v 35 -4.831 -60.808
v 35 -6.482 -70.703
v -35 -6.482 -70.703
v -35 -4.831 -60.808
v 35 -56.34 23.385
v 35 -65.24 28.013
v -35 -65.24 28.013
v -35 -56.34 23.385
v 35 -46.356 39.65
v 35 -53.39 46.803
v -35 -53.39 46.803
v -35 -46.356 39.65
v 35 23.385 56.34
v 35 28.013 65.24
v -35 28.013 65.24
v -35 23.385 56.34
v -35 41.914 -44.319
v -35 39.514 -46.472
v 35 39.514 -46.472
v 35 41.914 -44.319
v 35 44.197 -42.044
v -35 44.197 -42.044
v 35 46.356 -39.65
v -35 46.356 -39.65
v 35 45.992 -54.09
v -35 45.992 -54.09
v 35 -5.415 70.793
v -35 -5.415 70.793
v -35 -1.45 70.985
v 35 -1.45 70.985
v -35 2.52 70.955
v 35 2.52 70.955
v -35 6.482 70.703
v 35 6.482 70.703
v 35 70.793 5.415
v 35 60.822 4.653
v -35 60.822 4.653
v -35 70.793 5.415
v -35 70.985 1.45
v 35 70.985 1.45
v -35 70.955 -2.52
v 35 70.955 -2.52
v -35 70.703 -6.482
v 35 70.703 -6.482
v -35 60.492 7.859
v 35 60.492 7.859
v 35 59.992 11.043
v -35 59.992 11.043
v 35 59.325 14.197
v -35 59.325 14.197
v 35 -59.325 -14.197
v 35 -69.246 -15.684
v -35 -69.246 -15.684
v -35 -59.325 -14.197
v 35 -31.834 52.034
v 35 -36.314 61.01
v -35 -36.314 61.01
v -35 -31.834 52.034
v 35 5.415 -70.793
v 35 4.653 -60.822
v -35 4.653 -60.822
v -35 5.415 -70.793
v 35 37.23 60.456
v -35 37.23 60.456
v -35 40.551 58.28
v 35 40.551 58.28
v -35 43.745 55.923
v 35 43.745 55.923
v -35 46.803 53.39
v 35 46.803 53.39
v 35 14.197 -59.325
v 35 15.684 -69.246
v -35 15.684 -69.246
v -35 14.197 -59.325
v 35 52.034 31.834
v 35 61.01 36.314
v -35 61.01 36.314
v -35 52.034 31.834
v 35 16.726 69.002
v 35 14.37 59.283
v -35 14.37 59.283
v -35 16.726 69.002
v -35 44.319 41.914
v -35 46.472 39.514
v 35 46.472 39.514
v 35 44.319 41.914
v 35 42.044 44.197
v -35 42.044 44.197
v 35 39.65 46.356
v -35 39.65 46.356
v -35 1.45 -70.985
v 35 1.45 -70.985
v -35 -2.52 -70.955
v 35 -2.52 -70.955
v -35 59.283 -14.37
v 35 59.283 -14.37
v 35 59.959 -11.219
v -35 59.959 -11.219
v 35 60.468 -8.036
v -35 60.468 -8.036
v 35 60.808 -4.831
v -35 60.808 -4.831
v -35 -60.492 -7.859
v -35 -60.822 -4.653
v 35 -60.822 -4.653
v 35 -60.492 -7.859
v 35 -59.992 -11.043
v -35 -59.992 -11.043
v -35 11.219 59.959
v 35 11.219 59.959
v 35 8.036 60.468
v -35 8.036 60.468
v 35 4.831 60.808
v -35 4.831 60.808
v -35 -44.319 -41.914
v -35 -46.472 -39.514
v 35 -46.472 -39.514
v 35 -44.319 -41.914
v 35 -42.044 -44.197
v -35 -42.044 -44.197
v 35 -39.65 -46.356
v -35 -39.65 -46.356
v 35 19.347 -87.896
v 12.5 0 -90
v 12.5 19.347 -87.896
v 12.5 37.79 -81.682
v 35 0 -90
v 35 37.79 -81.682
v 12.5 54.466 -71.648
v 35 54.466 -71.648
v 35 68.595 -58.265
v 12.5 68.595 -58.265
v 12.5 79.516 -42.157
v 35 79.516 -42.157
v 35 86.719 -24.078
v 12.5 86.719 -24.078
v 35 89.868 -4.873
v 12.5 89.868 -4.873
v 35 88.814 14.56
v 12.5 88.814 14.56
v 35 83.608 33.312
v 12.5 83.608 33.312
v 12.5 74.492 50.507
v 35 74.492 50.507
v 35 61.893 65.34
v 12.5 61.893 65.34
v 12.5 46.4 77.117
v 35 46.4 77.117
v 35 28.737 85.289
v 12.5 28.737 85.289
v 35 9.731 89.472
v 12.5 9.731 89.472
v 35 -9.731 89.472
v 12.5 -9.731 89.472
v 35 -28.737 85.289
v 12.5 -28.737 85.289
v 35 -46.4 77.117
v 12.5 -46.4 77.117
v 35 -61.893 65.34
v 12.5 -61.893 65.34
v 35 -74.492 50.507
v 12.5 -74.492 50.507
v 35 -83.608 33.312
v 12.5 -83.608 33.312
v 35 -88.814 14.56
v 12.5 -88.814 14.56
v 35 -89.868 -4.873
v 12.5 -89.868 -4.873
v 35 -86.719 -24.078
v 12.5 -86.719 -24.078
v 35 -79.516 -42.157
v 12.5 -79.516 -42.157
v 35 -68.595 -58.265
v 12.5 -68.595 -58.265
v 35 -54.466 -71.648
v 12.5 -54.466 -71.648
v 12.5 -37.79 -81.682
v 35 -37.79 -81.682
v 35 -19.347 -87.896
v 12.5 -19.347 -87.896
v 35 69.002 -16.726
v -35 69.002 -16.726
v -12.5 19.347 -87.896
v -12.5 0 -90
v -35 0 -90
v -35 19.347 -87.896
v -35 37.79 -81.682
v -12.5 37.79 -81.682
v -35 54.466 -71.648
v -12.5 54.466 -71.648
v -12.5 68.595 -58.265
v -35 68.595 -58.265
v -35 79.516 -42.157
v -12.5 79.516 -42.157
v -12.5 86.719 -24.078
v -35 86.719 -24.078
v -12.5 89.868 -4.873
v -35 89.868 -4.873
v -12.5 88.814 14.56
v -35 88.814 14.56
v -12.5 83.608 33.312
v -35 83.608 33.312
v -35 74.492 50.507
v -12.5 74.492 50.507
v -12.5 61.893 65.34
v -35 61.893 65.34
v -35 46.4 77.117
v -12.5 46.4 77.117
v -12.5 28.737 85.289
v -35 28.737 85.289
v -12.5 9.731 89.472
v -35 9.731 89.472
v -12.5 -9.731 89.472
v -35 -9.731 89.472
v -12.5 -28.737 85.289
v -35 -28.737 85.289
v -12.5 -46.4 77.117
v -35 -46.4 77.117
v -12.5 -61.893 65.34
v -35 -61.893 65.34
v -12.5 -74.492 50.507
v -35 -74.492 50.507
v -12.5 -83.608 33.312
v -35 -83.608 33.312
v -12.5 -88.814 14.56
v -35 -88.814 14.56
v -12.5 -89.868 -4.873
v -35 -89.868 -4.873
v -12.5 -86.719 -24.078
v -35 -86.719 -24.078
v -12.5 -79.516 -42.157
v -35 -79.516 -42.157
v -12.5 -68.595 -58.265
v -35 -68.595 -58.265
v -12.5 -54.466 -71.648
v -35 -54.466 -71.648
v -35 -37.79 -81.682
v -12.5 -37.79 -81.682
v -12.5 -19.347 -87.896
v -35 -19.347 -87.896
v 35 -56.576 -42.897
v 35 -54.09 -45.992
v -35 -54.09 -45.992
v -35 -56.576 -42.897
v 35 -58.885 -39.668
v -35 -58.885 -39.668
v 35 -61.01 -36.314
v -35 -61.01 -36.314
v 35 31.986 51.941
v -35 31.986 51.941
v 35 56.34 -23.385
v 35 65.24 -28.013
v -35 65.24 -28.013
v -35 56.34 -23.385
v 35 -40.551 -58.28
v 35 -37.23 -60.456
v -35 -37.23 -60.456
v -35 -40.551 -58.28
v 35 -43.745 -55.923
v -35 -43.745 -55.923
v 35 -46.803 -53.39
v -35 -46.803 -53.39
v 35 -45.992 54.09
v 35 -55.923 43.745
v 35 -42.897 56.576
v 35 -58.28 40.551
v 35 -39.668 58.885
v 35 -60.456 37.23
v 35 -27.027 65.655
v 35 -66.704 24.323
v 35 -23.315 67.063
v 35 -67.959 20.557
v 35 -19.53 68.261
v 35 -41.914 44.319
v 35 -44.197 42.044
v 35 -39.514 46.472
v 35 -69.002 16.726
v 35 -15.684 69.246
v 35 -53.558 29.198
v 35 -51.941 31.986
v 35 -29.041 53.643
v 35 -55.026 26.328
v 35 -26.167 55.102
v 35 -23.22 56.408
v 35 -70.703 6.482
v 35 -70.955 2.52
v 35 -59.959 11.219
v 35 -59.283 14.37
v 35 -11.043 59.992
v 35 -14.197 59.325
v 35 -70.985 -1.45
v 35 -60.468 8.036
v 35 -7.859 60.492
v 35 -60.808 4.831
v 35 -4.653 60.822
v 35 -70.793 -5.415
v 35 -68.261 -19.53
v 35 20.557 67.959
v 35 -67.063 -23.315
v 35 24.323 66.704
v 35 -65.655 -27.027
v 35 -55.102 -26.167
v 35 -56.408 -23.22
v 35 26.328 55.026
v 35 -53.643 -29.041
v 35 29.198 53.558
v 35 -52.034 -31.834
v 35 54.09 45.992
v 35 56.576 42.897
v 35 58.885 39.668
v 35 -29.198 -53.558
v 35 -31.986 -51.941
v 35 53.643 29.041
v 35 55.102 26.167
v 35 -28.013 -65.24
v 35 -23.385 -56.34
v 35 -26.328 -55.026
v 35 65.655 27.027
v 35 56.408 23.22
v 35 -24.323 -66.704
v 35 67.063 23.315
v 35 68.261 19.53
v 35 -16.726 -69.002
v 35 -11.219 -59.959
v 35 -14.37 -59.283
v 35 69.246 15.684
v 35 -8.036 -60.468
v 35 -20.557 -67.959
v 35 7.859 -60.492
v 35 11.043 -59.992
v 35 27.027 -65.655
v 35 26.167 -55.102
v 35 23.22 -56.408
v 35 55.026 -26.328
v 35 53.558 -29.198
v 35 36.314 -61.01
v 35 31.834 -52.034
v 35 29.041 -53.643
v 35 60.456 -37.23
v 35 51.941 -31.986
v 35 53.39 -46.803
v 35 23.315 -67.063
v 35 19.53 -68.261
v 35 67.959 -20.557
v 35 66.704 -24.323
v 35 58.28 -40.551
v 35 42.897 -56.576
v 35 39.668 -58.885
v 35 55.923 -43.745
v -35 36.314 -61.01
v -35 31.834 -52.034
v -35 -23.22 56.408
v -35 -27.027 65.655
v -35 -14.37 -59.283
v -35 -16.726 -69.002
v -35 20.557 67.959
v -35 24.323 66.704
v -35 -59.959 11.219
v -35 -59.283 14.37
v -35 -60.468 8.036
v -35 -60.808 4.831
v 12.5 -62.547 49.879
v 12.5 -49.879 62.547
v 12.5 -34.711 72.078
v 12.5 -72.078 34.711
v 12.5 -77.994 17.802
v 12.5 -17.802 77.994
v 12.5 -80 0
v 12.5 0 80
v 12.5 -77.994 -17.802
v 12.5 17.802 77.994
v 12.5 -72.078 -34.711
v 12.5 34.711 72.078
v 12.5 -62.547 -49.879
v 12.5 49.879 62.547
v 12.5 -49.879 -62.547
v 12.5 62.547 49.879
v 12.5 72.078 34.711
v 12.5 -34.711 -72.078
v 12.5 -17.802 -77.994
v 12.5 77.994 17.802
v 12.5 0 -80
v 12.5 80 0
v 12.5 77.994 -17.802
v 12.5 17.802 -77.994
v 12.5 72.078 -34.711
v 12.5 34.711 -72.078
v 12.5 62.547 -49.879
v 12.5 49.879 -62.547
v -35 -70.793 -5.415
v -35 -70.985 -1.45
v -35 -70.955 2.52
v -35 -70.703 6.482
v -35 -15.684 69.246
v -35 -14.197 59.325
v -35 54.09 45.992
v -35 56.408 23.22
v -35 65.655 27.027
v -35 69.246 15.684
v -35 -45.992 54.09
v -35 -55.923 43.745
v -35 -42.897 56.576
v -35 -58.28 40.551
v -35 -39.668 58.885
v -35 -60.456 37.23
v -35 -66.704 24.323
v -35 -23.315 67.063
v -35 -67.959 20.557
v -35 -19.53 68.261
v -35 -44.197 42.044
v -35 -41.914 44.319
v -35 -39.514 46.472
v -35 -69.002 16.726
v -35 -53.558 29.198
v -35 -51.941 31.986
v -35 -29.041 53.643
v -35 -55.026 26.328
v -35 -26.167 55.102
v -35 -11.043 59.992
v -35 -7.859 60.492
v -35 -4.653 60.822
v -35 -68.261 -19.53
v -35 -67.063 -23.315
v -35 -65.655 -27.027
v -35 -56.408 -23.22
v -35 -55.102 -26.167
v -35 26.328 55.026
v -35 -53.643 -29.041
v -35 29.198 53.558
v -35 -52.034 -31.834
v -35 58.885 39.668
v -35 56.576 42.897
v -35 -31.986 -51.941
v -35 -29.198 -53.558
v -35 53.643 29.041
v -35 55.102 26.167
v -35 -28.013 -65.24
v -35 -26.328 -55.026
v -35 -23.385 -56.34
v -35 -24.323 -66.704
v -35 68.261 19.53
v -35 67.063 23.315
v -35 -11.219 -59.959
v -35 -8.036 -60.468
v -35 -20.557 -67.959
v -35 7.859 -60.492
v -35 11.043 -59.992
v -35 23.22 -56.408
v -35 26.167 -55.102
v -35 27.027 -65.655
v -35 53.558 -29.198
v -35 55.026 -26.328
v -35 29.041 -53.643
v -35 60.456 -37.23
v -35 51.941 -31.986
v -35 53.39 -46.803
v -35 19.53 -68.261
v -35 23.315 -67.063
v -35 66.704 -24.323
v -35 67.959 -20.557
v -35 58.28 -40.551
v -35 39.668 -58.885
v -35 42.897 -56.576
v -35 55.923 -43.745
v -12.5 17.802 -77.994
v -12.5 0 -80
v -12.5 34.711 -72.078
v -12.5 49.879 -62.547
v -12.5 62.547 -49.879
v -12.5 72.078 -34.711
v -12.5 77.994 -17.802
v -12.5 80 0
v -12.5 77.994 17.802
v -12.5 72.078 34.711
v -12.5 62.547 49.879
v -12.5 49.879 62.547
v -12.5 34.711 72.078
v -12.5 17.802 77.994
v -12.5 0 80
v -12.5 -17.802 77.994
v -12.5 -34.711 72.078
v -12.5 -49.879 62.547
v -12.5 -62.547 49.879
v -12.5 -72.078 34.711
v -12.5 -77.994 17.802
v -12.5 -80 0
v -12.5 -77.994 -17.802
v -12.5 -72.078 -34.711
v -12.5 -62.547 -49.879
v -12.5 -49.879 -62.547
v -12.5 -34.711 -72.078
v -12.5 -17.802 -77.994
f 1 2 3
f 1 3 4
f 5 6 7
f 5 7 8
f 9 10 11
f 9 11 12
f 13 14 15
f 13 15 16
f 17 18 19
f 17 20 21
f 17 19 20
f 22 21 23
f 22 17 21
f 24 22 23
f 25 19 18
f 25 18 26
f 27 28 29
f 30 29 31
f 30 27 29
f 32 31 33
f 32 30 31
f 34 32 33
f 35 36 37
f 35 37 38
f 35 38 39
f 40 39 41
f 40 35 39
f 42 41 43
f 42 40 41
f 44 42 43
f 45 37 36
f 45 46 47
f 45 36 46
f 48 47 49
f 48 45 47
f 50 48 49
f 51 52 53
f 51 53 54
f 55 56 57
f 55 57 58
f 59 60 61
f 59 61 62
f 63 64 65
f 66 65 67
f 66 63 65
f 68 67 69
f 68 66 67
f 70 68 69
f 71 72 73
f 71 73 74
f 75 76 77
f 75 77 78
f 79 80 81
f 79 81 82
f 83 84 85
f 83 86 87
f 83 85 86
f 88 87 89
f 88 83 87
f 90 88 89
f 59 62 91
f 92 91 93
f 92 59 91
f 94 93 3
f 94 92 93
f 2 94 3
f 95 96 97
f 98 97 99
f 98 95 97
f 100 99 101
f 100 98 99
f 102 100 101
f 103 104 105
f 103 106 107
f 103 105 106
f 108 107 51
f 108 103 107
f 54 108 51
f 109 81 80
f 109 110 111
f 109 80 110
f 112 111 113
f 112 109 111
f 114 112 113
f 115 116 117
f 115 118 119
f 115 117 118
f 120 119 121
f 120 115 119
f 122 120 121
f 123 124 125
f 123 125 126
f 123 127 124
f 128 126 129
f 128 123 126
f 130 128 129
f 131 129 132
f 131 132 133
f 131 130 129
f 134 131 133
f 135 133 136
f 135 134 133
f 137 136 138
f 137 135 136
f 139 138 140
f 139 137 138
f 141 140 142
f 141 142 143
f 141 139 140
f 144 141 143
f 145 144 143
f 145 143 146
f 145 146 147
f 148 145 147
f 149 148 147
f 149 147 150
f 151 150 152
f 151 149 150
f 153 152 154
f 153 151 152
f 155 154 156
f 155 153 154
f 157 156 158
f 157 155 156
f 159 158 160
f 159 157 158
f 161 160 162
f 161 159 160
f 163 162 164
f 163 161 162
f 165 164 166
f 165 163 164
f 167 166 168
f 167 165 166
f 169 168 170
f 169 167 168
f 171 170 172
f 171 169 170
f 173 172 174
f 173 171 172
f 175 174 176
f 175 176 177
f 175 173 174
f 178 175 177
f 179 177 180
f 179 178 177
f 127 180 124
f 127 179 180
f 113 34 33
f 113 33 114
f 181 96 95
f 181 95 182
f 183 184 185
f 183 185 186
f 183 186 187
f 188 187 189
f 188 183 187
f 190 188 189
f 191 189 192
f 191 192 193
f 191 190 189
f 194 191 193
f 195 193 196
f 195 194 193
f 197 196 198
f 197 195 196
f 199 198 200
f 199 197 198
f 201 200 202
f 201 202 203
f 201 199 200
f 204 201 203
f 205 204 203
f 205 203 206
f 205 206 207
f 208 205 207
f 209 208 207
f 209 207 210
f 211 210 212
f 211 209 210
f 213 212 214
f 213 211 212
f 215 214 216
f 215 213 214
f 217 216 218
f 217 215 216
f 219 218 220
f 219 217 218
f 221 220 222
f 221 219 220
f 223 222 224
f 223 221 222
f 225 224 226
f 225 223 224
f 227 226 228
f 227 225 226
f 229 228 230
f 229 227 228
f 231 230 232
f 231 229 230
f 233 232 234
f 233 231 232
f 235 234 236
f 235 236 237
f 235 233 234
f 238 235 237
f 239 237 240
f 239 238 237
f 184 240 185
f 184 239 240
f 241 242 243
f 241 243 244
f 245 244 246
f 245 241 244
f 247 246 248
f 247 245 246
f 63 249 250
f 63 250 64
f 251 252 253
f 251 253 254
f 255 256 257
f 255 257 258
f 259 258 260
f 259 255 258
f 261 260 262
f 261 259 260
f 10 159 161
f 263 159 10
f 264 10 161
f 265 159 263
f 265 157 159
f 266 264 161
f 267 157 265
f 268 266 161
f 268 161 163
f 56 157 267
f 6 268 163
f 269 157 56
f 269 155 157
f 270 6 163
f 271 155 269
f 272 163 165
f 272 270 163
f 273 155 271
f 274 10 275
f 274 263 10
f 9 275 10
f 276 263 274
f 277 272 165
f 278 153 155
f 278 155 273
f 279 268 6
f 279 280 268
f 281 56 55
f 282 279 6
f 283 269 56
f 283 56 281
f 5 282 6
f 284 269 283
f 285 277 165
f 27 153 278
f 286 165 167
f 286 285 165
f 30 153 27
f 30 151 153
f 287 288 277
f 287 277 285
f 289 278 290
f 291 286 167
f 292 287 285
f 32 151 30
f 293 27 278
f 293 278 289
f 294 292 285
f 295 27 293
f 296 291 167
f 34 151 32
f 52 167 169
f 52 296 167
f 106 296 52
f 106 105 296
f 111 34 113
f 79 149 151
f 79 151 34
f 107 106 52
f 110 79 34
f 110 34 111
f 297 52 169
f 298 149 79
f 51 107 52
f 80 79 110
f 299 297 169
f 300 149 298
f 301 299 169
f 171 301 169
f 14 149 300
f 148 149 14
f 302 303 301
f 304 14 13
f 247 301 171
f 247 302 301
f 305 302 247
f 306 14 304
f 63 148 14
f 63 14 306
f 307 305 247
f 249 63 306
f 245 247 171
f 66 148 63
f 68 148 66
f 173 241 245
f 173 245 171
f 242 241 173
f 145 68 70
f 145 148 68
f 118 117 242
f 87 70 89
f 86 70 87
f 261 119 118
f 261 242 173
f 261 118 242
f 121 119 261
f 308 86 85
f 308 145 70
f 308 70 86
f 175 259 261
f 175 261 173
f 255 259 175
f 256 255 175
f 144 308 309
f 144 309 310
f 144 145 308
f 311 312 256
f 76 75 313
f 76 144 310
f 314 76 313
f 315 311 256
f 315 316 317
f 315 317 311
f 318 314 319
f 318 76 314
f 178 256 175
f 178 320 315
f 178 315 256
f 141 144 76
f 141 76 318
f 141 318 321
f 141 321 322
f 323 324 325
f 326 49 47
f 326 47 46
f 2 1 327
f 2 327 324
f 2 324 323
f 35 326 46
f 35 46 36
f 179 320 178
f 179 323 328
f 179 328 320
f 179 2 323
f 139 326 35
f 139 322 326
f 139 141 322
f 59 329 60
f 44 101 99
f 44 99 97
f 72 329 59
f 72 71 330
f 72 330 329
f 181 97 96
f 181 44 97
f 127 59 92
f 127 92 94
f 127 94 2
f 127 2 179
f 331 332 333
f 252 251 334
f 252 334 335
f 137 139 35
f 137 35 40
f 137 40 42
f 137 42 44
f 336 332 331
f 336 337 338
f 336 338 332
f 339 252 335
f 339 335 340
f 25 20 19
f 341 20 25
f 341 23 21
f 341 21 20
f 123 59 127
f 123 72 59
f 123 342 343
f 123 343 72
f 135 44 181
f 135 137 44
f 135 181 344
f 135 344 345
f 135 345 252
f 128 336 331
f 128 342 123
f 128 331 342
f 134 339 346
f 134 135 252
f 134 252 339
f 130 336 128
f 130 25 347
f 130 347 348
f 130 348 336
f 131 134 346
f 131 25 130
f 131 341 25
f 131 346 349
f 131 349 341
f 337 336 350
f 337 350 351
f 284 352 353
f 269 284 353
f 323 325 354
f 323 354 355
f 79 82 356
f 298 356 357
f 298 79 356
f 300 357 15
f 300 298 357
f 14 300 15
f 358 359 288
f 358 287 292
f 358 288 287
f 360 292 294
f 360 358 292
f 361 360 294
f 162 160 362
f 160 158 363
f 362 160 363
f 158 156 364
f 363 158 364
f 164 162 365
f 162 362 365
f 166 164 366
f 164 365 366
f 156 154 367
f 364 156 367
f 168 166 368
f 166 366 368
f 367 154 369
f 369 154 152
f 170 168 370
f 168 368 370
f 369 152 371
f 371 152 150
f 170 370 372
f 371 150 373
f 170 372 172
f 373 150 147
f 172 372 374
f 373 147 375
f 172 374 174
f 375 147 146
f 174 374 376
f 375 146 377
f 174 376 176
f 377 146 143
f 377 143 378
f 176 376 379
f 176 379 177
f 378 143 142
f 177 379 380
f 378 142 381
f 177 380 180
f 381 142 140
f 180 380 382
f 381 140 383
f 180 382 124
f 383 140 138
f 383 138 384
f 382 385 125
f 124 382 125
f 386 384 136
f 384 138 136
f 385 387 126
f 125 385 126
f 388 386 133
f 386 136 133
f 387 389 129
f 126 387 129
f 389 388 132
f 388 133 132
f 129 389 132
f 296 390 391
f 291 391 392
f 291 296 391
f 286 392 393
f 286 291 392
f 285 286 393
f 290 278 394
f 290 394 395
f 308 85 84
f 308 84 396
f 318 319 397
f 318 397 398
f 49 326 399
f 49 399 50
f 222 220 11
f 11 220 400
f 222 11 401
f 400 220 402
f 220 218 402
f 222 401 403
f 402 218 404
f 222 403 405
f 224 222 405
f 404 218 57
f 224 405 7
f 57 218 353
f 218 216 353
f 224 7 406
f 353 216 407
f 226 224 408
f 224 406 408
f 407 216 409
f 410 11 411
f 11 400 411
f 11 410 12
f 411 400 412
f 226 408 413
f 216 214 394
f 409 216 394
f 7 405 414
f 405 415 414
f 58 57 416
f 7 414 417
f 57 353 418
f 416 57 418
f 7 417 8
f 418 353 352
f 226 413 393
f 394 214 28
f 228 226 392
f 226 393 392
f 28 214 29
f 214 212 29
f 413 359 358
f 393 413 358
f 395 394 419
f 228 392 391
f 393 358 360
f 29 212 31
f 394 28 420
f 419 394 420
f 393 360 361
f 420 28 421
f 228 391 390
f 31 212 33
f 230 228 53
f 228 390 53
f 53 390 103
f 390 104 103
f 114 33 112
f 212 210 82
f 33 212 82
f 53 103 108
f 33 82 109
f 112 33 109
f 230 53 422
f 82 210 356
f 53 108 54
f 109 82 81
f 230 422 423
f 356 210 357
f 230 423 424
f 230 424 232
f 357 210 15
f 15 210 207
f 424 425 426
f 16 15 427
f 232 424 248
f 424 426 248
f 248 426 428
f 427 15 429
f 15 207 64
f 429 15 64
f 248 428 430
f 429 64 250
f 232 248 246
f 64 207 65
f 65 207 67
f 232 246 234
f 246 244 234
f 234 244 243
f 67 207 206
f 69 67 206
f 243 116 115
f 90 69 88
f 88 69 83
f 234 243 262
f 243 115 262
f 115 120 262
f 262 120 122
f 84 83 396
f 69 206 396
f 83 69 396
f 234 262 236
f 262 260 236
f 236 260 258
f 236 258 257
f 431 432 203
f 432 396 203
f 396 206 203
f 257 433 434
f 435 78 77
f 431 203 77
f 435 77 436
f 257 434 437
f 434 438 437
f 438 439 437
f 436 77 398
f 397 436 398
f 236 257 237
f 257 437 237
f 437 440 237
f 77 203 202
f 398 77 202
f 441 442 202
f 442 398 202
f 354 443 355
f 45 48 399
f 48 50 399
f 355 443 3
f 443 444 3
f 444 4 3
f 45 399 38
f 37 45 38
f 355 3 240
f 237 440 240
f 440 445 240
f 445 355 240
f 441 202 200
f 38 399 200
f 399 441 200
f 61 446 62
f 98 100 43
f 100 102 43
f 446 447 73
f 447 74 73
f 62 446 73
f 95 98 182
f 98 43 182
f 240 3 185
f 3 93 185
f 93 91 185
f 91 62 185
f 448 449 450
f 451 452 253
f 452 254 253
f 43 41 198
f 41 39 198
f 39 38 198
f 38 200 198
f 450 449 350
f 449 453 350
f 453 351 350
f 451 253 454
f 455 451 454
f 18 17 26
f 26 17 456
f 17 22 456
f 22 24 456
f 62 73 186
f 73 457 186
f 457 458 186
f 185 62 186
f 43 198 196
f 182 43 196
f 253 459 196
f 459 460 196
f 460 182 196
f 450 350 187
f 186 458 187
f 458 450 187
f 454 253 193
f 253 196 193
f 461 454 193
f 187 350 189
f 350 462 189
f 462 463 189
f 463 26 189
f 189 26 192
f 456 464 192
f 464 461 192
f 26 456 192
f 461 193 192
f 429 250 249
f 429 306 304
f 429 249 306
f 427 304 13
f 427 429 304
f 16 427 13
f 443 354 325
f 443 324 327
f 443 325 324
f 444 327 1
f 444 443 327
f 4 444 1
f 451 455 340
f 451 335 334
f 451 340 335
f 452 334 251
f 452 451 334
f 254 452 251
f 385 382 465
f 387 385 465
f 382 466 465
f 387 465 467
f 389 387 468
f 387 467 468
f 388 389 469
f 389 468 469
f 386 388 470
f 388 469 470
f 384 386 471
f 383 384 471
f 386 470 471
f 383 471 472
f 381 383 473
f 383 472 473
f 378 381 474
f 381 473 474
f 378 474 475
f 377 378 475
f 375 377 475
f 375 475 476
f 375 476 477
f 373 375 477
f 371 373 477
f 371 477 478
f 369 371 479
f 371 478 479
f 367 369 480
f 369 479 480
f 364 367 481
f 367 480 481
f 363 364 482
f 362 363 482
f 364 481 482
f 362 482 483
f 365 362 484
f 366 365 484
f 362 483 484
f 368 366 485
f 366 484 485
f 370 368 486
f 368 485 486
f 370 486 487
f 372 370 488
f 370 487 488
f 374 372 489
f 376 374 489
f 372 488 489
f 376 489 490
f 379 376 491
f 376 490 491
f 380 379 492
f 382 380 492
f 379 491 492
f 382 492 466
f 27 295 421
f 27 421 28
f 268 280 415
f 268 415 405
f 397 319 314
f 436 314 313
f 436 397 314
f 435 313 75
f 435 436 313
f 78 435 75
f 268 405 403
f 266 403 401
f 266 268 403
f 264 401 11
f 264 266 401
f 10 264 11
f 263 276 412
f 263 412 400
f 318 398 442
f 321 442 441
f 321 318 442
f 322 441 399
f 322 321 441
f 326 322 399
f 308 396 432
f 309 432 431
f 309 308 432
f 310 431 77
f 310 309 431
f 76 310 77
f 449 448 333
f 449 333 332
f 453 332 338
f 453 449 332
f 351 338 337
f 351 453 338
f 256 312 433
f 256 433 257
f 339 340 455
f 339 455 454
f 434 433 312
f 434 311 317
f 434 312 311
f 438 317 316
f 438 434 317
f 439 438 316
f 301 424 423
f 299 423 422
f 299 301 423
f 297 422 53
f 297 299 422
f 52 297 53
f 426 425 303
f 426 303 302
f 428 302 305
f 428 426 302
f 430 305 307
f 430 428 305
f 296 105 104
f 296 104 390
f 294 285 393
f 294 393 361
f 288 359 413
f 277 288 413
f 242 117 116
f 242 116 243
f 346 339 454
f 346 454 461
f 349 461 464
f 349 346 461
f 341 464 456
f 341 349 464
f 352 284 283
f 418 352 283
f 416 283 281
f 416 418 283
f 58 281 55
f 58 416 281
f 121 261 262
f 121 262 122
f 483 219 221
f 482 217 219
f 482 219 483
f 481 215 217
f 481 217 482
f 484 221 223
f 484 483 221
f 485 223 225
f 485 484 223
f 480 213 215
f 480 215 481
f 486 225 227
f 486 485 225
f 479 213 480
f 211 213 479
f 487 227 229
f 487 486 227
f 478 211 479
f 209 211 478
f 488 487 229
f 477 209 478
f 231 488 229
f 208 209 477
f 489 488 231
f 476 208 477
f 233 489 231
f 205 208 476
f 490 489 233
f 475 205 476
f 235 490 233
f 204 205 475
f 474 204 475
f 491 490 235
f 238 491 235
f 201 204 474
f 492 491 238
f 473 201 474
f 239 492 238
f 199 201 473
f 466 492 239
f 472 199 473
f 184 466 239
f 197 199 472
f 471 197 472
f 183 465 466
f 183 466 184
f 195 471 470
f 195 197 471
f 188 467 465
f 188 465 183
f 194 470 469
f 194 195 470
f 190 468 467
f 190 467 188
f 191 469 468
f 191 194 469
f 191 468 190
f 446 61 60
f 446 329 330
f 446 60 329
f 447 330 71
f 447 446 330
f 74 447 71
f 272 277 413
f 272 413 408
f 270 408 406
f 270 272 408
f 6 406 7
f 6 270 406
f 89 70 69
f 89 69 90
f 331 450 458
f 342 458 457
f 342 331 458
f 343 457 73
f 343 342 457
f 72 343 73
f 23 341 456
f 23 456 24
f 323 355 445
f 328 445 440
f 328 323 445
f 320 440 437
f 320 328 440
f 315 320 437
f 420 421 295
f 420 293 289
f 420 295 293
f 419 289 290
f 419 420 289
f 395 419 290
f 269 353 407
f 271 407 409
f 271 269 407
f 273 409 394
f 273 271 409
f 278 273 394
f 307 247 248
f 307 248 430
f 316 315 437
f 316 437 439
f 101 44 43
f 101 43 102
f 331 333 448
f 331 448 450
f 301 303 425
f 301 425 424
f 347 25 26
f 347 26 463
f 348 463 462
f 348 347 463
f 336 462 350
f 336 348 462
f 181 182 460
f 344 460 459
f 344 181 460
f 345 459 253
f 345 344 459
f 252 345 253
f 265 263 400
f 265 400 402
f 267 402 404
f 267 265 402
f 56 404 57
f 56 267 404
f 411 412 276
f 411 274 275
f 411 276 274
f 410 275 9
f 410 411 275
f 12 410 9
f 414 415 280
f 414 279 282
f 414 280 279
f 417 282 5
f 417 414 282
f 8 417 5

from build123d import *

# Parameters (mm, degrees)
SKETCH1_R           = 90
SKETCH1_R_2         = 61
BOSS_EXTRUDE1_DEPTH = 35
SKETCH2_R           = 59
CUT_EXTRUDE1_DEPTH  = 71
CIRPATTERN1_COUNT   = 20
CUT_EXTRUDE2_START  = -35
SKETCH3_R           = 90
SKETCH3_R_2         = 80
CUT_EXTRUDE2_DEPTH  = 12.5


with BuildPart() as part:
    # Sketch1 → Boss-Extrude1 (new body, symmetric)
    with BuildSketch(Plane(origin=(0, 0, 0), x_dir=(0, 0, -1), z_dir=(1, 0, 0))):
        Circle(SKETCH1_R)
        Circle(SKETCH1_R_2, mode=Mode.SUBTRACT)
    extrude(amount=BOSS_EXTRUDE1_DEPTH, both=True)

    # Sketch2 → Cut-Extrude1 (cut, through all)
    with BuildSketch(Plane(origin=(35, 0, 0), x_dir=(0, 0, -1), z_dir=(1, 0, 0))):
        Circle(SKETCH2_R)
        with BuildLine():
            Line((0, 51.395835648), (-4.5, 58.828139525))
            Line((-4.5, 58.828139525), (-5.415254237, 70.793184852))
            ThreePointArc((-5.415254237, 70.793184852), (0.535268123, 70.997982281), (6.48202623, 70.703488853))
            Line((6.48202623, 70.703488853), (4.5, 58.828139525))
            Line((4.5, 58.828139525), (0, 51.395835648))
        make_face()
    cut_extrude1 = extrude(amount=-CUT_EXTRUDE1_DEPTH, mode=Mode.SUBTRACT)

    # CirPattern1: Cut-Extrude1 ×20 about axis
    cirpattern1_axis = Axis((0, 0, 0), (1, 0, 0))
    for i in range(1, CIRPATTERN1_COUNT):
        add(cut_extrude1.rotate(cirpattern1_axis, i * 360 / CIRPATTERN1_COUNT), mode=Mode.SUBTRACT)

    # Sketch3 → Cut-Extrude2 (cut, symmetric)
    with BuildSketch(Plane(origin=(35, 0, 0), x_dir=(0, 0, -1), z_dir=(1, 0, 0)).offset(CUT_EXTRUDE2_START)):
        Circle(SKETCH3_R)
        Circle(SKETCH3_R_2, mode=Mode.SUBTRACT)
    extrude(amount=CUT_EXTRUDE2_DEPTH, both=True, mode=Mode.SUBTRACT)


solid = part.part
